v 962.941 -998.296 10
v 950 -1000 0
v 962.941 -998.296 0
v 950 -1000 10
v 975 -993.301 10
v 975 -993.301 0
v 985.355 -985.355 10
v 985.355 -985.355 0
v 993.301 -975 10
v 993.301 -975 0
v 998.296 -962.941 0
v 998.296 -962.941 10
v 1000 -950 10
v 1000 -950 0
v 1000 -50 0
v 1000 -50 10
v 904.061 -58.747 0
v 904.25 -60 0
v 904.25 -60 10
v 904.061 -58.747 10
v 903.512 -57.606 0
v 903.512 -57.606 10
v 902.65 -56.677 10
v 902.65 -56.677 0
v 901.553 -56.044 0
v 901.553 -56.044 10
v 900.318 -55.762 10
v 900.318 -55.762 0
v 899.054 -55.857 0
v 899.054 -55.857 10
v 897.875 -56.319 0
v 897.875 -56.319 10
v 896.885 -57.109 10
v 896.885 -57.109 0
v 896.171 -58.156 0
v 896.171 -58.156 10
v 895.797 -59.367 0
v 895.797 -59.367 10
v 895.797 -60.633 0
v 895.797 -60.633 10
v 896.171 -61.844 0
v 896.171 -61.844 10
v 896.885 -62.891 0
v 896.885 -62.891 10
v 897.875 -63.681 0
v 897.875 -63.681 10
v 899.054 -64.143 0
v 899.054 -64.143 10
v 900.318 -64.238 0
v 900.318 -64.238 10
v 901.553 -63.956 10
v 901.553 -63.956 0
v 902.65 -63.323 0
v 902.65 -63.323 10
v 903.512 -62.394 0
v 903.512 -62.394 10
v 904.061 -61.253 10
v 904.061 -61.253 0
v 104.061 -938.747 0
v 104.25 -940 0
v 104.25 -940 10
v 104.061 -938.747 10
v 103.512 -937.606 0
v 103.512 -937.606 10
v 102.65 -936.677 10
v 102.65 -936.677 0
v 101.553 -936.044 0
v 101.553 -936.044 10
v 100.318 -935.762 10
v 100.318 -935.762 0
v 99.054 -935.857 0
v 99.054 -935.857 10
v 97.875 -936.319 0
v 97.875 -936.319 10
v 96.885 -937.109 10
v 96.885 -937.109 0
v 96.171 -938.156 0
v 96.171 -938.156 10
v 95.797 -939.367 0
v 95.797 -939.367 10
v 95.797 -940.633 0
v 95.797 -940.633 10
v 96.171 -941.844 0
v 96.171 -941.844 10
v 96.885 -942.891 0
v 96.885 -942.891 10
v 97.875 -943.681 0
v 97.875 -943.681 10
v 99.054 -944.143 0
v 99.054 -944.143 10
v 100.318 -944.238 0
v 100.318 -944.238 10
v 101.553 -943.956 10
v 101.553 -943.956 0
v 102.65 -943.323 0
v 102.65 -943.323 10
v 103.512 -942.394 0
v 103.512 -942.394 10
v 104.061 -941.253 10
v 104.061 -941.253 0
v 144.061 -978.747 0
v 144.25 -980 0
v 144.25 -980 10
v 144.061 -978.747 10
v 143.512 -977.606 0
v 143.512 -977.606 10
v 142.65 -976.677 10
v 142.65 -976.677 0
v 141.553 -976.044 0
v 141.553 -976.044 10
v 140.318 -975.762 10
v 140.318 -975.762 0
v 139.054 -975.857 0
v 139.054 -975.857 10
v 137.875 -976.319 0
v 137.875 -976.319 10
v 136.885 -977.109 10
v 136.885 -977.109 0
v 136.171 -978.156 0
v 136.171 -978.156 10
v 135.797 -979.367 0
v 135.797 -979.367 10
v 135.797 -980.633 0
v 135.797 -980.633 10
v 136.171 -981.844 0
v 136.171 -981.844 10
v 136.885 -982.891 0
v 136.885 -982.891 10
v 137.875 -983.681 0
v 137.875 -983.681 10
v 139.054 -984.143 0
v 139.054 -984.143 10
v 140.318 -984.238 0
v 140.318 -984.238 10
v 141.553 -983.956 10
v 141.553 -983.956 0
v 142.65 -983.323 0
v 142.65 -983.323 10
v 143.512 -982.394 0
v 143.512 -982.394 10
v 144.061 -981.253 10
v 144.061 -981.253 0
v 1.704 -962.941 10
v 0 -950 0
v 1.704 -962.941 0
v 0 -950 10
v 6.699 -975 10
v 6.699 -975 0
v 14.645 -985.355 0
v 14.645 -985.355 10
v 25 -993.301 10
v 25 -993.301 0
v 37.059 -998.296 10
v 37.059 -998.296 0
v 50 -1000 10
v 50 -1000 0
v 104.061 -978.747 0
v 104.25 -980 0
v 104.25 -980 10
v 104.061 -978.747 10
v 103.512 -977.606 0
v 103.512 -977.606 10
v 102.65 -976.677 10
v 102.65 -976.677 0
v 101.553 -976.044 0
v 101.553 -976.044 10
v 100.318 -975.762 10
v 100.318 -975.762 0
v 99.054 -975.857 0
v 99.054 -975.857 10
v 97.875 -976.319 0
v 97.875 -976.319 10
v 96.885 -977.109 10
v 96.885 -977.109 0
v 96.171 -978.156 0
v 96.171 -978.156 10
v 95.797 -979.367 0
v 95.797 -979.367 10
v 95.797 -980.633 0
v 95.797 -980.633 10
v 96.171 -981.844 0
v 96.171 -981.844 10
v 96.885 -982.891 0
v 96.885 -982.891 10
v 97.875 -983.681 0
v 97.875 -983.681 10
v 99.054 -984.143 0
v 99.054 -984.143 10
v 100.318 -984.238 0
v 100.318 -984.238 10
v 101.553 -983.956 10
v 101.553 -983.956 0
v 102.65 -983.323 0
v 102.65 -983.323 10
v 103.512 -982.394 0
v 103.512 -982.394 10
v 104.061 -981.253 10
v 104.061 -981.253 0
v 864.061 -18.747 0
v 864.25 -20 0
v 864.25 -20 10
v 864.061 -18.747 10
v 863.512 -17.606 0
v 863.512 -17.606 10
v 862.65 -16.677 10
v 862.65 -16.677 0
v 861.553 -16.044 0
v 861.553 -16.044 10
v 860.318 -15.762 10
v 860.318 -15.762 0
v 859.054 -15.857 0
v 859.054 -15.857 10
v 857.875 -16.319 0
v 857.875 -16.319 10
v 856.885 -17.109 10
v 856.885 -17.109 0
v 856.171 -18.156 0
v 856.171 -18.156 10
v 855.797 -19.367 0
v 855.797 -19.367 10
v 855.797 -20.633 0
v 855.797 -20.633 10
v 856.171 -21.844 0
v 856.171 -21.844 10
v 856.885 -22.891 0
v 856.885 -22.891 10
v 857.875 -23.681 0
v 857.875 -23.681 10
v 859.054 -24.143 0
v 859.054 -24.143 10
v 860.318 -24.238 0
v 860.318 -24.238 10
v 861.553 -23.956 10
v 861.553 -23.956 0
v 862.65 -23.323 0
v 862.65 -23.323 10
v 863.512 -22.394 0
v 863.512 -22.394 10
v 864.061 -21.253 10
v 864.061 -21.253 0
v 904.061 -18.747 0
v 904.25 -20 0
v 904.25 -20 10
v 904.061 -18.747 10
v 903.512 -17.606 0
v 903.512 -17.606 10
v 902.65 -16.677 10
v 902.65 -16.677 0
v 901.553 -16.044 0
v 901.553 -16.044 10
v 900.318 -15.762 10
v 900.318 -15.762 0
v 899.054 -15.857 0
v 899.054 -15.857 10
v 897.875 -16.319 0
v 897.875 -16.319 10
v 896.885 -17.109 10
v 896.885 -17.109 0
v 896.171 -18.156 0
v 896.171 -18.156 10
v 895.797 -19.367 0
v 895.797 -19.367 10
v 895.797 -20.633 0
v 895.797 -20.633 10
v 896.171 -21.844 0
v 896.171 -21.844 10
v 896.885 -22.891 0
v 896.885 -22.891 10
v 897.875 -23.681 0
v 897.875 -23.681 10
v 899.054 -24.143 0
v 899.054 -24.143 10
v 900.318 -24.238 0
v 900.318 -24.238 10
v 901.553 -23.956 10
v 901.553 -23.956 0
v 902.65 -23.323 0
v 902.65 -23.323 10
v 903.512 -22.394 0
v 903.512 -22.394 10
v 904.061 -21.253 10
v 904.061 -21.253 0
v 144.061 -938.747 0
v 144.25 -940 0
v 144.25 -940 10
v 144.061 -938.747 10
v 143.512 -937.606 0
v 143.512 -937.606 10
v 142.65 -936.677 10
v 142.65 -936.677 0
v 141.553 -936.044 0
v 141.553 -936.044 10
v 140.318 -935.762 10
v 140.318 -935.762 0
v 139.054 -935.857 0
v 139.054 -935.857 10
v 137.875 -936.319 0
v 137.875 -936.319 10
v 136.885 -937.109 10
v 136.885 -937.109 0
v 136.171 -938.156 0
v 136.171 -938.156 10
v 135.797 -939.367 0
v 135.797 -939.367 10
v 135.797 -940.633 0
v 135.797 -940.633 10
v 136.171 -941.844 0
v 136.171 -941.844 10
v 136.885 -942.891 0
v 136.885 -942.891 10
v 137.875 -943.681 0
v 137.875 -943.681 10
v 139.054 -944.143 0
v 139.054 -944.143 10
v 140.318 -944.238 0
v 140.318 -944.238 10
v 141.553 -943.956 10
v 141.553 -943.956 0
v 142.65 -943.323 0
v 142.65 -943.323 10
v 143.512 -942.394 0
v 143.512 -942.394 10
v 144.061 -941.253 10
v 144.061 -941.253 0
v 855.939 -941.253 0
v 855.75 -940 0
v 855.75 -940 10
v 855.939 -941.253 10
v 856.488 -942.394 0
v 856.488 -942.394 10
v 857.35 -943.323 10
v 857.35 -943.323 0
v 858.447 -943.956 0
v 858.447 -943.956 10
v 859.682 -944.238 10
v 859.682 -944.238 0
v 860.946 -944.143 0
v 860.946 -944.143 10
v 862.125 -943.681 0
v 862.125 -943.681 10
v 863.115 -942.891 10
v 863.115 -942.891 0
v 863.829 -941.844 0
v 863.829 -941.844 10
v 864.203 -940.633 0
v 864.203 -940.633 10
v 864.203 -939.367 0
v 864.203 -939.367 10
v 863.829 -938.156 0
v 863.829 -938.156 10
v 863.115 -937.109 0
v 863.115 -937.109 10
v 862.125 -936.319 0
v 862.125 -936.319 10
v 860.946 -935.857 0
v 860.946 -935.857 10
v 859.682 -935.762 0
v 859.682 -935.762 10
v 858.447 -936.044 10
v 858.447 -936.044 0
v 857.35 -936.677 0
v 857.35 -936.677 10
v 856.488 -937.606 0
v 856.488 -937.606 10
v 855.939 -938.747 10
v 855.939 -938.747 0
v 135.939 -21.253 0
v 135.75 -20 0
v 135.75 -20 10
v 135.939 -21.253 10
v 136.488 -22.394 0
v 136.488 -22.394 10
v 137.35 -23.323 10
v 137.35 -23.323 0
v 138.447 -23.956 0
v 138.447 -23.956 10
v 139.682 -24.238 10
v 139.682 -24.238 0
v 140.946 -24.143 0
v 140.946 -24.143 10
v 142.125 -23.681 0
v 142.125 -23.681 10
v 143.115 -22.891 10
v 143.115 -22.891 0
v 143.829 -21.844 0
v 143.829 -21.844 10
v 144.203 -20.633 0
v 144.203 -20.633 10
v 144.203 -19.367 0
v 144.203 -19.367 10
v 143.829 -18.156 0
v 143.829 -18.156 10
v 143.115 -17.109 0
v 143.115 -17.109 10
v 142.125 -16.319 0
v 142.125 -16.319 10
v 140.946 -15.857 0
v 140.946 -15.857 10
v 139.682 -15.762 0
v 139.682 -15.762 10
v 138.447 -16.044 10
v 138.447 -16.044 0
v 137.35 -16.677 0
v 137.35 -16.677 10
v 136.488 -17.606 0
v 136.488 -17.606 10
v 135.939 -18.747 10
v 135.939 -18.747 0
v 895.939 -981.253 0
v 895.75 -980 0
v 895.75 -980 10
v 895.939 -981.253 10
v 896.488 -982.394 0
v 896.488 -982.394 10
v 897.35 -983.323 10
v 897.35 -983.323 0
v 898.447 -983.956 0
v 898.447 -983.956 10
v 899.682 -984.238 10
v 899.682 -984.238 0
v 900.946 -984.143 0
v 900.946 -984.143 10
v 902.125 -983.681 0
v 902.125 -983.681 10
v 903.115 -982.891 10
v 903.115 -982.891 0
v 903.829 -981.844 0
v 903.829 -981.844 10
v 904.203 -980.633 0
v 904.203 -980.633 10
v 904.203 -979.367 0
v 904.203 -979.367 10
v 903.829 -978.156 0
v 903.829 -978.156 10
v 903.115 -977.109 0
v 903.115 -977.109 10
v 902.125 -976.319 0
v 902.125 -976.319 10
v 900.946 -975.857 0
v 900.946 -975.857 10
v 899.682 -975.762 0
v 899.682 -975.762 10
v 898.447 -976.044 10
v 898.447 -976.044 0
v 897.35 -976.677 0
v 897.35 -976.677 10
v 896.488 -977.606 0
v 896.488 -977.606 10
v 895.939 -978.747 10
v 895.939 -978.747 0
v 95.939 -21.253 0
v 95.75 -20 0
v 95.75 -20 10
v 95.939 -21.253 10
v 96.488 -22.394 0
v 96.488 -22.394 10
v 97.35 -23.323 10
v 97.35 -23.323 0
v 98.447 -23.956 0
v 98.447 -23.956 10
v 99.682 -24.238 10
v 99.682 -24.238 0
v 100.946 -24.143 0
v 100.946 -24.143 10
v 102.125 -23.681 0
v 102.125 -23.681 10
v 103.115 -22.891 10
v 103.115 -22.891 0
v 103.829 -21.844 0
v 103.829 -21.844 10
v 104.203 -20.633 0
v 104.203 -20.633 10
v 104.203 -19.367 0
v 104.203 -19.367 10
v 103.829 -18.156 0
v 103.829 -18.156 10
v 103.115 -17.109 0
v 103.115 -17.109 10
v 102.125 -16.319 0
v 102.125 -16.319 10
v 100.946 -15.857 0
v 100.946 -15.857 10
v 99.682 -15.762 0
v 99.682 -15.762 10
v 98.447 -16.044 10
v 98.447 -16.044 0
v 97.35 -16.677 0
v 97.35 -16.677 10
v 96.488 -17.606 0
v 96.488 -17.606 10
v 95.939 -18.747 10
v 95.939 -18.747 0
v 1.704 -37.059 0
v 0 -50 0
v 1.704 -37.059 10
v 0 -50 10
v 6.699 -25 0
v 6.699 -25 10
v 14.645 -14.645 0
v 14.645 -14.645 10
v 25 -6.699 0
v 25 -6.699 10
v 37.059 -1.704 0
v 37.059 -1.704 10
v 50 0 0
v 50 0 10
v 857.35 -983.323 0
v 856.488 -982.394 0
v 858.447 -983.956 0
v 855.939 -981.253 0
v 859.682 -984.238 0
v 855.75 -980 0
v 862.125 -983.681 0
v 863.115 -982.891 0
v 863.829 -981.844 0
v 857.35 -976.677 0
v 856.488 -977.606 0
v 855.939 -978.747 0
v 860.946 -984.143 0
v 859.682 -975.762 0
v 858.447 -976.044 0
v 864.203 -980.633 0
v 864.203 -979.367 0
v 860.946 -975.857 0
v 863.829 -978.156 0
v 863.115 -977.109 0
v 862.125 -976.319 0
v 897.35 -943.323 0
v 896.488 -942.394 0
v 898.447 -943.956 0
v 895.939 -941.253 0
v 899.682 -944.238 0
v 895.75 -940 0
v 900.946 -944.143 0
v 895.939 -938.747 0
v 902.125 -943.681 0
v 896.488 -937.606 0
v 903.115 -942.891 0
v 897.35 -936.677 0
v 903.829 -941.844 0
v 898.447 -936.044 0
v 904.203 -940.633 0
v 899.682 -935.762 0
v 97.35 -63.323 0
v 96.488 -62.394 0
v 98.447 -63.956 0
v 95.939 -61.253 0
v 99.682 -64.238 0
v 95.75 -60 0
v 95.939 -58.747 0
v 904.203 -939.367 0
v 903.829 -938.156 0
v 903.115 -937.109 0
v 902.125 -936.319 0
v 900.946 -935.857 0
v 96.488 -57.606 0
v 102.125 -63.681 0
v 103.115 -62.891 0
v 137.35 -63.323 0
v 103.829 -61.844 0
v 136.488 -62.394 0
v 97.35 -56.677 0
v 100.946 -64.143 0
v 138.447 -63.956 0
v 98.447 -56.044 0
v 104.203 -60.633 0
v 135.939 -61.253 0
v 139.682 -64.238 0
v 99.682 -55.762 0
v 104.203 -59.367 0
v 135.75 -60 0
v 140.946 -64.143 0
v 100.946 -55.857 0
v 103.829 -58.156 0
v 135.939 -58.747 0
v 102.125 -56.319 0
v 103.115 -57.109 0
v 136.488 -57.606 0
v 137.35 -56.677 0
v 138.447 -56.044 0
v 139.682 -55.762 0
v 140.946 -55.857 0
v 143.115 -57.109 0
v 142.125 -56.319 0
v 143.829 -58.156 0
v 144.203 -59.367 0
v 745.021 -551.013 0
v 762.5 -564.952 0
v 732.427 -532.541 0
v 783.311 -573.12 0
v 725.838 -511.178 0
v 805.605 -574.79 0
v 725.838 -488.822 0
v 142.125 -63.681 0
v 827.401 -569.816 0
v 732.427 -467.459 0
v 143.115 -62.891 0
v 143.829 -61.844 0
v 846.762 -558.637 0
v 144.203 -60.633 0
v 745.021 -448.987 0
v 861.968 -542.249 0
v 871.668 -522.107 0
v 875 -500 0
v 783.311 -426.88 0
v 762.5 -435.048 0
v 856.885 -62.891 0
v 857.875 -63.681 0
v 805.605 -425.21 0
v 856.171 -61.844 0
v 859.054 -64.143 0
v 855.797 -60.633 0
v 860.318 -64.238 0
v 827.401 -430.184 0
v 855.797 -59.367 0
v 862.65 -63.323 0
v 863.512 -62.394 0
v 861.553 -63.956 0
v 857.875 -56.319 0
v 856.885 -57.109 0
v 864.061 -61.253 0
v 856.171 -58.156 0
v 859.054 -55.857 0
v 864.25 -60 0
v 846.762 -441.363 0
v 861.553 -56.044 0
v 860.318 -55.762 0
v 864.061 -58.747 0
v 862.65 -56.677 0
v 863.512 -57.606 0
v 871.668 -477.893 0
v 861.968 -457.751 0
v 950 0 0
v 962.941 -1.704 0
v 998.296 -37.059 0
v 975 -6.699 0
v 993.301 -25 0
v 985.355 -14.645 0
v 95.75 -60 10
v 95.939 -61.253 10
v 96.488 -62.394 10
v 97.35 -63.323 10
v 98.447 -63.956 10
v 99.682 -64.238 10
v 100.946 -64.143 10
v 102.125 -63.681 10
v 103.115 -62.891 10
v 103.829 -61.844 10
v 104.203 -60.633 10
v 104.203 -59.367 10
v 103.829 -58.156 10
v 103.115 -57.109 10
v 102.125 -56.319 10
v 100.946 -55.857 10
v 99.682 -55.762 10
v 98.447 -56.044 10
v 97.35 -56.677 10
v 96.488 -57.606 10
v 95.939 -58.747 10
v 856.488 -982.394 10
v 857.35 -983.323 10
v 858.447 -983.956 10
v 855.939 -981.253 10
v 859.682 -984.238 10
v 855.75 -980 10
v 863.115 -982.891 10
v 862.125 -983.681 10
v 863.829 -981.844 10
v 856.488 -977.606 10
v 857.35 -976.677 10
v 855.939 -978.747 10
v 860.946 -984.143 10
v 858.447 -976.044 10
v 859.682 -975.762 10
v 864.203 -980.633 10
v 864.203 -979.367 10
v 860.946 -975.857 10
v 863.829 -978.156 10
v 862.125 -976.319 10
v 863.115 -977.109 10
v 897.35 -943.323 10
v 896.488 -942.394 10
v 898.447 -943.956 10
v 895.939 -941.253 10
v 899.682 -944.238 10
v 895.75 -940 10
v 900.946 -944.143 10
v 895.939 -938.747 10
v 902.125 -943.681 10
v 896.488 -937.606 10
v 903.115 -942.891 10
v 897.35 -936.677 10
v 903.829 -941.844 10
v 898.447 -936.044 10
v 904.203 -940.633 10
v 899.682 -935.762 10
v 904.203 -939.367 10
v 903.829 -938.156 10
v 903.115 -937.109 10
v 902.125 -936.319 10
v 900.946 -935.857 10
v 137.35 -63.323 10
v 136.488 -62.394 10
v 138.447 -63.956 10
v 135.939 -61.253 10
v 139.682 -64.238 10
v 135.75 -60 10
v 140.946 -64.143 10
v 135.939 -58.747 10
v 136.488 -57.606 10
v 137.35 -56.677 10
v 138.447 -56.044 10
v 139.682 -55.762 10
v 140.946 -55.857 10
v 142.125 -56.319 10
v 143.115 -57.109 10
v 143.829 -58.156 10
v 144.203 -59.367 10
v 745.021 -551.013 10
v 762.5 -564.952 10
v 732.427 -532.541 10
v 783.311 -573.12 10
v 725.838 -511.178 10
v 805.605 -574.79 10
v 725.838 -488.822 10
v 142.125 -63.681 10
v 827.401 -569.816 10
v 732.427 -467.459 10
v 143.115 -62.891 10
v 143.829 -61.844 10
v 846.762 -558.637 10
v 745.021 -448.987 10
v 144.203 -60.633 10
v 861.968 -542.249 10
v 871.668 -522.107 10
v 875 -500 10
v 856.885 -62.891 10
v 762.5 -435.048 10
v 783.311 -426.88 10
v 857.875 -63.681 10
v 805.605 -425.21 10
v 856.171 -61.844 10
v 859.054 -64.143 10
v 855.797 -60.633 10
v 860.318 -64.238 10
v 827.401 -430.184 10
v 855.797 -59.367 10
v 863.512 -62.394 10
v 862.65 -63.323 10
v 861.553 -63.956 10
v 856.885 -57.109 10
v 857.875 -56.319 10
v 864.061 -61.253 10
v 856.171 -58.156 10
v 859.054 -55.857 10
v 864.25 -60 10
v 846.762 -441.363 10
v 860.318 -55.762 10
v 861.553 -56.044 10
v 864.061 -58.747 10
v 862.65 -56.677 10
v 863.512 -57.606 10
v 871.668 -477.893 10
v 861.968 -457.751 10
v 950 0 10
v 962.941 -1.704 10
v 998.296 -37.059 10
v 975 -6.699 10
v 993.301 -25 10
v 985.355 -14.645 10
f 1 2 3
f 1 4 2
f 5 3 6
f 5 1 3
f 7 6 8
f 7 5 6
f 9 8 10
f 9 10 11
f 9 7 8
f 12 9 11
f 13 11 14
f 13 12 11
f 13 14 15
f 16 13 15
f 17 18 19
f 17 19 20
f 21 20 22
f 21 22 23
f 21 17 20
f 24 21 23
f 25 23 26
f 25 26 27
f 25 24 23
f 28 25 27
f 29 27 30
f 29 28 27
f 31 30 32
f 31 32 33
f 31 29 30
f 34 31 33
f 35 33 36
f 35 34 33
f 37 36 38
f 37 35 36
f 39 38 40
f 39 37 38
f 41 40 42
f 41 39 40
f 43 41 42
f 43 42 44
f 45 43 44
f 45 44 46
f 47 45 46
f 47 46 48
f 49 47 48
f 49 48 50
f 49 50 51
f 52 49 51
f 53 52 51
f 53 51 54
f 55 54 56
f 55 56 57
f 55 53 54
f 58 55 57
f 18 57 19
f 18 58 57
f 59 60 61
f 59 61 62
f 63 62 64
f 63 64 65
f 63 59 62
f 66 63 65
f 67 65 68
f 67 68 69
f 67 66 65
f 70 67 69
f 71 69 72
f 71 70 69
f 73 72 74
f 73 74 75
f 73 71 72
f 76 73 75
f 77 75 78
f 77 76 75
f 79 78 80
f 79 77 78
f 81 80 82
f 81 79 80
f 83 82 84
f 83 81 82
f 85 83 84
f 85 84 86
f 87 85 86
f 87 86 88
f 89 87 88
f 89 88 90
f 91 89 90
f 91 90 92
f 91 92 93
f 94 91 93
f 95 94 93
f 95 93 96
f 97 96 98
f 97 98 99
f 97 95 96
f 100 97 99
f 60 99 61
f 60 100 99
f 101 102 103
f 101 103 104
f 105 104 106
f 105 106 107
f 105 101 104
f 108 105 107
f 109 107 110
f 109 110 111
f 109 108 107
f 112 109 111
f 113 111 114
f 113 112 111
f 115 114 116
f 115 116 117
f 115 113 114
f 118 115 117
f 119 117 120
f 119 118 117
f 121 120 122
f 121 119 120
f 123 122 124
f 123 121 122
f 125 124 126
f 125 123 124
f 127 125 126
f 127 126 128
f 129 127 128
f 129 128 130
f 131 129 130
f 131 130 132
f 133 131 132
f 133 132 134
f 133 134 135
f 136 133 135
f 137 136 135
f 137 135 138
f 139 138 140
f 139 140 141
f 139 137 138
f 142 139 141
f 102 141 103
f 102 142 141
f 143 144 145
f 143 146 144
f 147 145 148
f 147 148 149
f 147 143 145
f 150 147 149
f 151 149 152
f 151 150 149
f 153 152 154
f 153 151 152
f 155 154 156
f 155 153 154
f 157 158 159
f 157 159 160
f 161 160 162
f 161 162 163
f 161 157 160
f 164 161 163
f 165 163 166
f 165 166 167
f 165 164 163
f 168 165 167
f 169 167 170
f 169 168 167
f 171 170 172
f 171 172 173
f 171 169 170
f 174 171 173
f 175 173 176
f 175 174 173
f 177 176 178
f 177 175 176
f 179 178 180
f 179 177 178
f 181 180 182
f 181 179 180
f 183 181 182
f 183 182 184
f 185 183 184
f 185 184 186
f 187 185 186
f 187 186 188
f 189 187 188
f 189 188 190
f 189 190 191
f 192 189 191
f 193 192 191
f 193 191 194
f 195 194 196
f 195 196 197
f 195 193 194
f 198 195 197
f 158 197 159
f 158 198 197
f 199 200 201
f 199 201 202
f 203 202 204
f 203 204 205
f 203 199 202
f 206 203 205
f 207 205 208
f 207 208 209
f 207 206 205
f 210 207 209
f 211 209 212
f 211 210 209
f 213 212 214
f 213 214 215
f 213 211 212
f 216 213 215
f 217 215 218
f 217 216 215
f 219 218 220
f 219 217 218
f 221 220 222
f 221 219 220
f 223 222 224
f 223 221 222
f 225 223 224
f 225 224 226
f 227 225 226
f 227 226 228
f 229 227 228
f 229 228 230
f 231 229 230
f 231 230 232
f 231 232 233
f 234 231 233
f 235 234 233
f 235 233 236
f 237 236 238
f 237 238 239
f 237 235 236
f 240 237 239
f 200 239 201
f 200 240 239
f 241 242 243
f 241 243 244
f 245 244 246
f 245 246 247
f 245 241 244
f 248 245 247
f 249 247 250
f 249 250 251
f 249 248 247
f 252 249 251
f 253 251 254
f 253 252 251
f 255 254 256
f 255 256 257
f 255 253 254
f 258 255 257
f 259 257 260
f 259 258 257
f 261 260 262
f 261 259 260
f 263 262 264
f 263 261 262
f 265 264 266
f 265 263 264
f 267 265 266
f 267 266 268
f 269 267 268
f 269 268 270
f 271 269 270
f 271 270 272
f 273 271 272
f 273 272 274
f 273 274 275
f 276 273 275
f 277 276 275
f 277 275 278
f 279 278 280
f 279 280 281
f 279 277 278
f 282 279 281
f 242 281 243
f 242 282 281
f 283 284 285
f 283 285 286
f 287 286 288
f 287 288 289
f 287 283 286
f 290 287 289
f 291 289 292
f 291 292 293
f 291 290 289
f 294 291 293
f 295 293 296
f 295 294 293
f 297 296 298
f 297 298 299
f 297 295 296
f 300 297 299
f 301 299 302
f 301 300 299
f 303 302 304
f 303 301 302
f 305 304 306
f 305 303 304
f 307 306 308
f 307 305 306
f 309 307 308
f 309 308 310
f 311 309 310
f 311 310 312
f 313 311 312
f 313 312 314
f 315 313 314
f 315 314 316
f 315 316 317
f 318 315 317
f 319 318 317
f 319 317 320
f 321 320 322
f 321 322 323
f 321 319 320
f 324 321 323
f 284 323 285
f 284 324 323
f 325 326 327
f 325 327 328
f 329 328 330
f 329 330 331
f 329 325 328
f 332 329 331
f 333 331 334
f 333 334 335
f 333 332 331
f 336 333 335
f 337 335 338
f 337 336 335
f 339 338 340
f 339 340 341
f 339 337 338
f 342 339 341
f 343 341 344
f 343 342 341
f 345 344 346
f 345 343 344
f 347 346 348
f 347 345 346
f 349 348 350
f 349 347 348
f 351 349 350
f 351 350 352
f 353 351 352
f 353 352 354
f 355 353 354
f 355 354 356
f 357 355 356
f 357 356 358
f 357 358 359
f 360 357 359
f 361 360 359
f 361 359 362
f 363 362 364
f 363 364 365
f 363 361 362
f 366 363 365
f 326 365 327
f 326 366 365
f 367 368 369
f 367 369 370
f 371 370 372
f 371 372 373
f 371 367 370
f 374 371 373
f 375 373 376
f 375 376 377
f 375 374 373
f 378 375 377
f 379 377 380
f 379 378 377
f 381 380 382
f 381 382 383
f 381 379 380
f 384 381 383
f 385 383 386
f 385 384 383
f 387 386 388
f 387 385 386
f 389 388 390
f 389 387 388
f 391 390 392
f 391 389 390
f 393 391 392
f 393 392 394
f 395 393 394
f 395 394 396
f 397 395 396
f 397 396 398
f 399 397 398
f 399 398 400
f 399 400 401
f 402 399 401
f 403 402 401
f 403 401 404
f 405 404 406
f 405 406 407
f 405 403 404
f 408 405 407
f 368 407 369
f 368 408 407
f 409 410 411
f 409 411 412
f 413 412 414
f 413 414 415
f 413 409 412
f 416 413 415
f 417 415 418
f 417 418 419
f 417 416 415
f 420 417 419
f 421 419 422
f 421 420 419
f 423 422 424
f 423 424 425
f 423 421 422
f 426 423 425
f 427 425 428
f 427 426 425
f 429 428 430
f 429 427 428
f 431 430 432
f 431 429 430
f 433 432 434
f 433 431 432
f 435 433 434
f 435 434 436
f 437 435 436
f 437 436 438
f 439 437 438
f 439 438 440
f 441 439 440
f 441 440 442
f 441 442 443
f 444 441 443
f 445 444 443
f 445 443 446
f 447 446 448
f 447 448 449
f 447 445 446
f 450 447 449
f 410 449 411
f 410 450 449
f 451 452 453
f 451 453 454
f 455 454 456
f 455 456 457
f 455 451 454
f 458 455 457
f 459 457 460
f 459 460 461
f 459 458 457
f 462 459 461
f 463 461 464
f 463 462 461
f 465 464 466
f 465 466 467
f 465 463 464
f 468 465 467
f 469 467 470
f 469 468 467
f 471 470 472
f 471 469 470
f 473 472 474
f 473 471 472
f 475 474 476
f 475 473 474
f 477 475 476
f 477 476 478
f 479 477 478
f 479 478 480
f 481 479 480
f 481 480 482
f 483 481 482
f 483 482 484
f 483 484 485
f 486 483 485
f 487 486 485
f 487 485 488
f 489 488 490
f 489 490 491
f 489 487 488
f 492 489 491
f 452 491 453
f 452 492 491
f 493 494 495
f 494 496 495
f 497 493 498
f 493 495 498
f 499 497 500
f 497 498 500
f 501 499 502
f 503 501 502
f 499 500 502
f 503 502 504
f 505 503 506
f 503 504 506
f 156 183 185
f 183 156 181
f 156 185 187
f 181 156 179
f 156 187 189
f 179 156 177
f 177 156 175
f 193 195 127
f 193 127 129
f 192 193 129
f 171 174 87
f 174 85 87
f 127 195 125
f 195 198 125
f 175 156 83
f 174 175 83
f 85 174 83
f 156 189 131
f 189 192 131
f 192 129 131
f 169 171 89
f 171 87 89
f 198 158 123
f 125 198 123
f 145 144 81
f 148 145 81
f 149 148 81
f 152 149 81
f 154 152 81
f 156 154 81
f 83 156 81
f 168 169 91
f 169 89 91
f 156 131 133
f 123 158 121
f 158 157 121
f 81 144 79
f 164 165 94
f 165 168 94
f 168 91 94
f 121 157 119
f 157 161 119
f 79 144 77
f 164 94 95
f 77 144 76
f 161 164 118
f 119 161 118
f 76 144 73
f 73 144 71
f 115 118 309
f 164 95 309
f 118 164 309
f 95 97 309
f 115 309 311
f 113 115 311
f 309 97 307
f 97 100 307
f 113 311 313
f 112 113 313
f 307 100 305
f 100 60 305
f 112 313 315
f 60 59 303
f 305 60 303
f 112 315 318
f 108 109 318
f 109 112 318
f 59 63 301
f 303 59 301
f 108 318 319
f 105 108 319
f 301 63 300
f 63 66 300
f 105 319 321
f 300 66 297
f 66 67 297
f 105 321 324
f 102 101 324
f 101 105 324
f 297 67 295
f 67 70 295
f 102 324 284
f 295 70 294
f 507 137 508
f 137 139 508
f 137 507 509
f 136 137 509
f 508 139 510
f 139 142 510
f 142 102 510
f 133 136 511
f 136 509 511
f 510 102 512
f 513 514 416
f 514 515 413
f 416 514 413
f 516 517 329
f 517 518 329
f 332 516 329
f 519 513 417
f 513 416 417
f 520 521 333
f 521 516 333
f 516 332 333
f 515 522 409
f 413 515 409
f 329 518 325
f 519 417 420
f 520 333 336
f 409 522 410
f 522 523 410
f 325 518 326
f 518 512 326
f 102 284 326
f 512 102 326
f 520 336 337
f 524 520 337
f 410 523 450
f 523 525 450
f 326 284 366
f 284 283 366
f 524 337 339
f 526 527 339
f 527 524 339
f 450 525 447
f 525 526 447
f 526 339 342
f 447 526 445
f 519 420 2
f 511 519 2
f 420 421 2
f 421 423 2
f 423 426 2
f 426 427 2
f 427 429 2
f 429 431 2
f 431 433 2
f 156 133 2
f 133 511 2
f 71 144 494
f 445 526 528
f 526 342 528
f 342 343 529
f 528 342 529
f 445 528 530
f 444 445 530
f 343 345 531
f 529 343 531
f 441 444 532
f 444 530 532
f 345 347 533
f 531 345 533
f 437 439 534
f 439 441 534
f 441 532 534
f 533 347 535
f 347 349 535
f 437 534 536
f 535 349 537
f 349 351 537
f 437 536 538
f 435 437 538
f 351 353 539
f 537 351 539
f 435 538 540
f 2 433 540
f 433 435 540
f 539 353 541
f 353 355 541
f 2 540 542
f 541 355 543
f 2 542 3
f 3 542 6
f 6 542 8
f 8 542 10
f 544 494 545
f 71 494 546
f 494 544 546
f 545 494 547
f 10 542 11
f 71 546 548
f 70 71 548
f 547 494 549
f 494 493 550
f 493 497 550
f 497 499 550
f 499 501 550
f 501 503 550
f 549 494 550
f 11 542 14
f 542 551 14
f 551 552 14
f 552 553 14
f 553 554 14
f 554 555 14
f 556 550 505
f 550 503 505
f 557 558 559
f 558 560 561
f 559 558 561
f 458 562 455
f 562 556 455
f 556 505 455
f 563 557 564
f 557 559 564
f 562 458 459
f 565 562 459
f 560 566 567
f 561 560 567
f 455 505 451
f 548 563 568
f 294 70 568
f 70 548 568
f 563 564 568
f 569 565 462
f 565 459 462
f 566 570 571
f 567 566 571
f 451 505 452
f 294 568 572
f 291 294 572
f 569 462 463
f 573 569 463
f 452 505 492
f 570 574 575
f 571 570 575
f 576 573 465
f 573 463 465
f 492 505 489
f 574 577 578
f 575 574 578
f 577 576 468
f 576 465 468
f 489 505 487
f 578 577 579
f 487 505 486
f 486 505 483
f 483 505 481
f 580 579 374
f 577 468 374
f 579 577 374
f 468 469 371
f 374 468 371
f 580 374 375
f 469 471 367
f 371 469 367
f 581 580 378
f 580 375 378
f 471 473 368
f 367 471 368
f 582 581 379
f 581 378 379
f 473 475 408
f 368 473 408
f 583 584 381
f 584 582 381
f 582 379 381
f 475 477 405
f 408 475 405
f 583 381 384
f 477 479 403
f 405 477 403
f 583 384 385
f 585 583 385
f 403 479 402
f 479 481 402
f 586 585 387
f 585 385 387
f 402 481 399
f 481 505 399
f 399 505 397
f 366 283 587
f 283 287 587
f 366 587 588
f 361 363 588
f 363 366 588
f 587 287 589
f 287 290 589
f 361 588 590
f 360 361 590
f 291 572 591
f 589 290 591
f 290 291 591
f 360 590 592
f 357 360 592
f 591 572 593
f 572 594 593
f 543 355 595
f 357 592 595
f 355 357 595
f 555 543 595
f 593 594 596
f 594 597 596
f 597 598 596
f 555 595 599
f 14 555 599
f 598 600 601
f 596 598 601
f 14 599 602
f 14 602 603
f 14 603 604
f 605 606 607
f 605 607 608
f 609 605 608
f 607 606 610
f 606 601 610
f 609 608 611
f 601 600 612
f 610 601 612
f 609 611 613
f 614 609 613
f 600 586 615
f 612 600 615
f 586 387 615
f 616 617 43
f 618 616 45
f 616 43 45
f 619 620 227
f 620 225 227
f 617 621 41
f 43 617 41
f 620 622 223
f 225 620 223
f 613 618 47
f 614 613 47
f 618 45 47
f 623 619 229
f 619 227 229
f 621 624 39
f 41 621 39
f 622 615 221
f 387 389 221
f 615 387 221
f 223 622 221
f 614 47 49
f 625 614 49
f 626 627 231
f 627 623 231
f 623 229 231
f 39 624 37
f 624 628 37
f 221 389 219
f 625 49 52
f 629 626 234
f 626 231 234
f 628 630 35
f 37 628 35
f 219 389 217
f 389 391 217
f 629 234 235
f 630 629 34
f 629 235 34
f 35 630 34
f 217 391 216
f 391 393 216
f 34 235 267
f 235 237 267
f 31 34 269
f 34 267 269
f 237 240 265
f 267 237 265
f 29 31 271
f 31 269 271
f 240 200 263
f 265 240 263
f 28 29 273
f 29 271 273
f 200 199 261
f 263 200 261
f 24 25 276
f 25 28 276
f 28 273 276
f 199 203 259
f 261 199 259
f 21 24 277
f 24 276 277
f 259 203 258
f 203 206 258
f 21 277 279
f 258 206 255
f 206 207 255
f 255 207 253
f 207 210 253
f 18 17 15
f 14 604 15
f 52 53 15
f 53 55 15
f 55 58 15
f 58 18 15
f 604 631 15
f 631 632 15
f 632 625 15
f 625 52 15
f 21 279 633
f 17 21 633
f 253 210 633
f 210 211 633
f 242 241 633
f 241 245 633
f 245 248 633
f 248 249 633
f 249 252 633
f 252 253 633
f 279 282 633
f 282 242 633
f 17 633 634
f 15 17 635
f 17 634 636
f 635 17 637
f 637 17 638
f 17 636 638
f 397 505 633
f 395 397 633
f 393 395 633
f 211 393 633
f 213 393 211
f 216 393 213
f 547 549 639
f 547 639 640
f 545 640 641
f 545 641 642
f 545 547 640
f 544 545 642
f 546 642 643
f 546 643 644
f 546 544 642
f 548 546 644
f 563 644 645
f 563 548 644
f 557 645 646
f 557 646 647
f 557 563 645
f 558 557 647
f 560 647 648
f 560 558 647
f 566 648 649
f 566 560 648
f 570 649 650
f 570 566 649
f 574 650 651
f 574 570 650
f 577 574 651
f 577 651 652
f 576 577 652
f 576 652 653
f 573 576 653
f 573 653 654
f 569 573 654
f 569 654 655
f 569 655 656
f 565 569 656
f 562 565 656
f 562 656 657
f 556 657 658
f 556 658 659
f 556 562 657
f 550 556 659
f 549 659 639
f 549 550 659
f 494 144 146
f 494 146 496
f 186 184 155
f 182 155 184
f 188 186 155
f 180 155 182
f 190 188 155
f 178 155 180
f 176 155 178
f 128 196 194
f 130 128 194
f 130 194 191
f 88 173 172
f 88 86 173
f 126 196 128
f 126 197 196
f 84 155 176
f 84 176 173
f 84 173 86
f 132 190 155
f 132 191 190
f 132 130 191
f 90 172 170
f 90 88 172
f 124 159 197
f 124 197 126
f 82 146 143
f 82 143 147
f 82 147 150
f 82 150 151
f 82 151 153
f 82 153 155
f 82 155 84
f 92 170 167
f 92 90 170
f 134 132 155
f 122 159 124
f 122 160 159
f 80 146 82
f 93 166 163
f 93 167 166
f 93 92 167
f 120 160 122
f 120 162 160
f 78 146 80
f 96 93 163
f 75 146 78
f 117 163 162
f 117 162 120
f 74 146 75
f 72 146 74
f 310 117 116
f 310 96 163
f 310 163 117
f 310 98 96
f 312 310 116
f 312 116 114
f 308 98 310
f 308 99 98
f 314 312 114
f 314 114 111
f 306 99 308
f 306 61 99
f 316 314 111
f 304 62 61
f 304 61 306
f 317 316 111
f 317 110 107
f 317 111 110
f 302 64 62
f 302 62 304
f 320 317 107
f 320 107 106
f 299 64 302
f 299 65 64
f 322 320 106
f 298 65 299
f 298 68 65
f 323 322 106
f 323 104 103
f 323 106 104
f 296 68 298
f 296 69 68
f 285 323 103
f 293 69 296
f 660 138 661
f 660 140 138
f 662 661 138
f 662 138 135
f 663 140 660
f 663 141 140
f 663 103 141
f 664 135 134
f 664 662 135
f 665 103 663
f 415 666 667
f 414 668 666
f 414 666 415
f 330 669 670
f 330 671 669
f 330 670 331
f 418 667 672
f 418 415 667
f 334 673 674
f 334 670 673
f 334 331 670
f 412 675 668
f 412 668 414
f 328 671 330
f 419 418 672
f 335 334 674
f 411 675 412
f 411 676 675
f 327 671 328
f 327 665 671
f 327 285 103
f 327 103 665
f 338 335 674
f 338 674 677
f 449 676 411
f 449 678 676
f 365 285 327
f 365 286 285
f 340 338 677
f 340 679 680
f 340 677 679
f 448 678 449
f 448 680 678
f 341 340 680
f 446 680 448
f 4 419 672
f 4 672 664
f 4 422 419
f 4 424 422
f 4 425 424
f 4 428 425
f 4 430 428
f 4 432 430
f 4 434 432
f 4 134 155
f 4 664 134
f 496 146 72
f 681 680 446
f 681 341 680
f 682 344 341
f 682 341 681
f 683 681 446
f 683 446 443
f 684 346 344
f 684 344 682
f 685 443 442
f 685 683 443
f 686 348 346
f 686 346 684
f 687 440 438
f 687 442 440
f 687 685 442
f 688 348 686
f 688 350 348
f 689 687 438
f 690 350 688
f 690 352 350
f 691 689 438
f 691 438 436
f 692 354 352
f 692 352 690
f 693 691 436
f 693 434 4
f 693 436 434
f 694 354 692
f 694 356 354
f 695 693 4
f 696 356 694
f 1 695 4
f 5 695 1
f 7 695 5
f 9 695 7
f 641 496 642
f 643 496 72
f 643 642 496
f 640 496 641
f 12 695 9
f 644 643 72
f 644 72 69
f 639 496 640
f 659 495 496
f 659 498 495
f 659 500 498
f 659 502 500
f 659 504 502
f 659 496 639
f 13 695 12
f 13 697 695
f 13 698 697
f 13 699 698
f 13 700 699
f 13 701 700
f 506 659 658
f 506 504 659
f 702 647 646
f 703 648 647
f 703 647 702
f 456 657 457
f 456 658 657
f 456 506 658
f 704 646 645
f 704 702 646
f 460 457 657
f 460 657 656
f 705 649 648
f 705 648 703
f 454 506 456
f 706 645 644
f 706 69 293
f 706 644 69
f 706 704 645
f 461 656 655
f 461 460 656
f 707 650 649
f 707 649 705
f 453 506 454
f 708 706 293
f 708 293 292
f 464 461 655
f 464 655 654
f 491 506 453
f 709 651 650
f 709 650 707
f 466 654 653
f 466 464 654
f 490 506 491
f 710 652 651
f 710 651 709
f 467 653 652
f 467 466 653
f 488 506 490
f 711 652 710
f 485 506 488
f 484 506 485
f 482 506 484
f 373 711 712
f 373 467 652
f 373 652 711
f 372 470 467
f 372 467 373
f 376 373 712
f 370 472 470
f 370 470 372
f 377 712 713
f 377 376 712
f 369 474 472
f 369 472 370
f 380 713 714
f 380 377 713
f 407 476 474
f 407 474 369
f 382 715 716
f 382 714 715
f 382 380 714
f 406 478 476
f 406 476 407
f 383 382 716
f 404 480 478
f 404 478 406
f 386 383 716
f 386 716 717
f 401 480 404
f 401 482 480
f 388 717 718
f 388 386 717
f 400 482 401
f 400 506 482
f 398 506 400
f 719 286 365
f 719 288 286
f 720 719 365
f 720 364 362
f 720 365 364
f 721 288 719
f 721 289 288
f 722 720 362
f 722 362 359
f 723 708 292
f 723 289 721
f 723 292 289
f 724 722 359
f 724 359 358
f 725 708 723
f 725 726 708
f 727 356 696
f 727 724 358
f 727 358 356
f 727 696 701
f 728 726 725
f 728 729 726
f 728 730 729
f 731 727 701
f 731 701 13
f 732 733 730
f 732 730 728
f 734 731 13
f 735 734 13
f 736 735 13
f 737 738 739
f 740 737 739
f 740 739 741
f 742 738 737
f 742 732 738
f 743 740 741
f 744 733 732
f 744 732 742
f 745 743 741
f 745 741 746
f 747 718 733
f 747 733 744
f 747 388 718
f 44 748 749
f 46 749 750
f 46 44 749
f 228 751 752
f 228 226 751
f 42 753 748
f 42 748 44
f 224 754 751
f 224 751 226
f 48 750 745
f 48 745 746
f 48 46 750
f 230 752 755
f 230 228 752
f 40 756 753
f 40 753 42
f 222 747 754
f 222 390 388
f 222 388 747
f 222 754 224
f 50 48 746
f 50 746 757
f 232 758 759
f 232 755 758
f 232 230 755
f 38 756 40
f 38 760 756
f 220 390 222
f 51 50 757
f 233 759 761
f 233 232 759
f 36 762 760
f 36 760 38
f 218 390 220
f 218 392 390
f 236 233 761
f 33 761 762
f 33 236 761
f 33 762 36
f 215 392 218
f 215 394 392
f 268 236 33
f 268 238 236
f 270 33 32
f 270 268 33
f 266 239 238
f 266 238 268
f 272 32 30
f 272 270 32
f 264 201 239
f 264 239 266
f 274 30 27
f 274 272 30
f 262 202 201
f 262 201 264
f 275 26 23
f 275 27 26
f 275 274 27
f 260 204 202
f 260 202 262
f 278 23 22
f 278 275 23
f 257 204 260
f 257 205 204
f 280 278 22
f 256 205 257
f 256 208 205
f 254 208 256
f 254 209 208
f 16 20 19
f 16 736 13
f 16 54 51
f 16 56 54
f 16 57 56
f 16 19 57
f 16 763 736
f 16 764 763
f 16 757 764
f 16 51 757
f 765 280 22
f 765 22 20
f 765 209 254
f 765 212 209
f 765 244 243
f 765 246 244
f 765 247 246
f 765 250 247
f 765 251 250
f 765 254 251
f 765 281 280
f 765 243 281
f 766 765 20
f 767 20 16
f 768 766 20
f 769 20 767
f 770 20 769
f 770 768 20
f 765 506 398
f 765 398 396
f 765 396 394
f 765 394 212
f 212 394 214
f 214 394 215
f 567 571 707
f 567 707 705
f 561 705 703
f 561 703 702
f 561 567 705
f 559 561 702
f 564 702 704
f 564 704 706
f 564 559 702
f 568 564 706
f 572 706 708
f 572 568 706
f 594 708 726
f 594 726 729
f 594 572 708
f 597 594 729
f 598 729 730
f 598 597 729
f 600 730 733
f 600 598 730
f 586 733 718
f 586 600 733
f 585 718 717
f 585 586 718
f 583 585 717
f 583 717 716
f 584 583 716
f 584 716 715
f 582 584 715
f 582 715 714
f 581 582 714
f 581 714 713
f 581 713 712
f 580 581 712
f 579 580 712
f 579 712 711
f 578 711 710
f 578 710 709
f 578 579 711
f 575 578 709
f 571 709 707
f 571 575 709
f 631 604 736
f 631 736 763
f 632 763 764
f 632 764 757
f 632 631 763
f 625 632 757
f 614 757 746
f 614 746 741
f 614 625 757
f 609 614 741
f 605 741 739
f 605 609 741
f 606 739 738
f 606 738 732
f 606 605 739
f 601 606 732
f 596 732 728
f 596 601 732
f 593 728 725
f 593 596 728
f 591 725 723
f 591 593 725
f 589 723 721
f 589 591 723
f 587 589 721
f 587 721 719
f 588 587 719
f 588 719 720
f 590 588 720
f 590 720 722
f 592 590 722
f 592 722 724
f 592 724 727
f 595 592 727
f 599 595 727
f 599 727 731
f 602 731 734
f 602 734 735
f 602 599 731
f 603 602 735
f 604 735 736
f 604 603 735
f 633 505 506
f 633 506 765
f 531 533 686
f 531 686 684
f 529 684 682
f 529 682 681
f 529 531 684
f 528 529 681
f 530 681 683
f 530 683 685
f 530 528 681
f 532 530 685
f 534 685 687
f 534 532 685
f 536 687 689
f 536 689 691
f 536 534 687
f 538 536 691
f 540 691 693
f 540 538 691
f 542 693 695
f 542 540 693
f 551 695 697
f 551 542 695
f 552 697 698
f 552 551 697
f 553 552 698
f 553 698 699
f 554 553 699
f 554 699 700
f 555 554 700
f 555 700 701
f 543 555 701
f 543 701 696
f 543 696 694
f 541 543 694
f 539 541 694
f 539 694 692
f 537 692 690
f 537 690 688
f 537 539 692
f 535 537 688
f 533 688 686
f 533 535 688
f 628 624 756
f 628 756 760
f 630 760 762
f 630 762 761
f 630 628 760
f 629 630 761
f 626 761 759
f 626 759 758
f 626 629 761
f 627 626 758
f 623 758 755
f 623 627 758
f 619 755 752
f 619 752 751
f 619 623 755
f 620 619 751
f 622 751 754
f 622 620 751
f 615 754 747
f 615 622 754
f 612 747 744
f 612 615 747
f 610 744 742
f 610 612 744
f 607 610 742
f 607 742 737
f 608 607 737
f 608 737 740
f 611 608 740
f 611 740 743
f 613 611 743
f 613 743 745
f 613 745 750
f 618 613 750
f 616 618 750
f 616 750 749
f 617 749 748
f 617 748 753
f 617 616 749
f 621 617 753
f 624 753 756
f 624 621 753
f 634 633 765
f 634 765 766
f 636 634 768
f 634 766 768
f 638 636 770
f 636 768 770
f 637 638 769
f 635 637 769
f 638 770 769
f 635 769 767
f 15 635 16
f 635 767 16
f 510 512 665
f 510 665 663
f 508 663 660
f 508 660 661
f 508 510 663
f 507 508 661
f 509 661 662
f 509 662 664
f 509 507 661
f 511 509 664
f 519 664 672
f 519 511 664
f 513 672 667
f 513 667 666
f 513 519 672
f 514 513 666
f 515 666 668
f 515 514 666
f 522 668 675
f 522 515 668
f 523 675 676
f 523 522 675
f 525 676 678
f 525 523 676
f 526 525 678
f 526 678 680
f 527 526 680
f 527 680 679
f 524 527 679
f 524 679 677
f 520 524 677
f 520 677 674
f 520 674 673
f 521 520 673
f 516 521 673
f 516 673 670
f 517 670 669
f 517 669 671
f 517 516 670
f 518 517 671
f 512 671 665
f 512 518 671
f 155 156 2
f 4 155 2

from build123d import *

# Parameters (mm, degrees)
SKETCH_1_W      = 1000
SKETCH_1_H      = 1000
SKETCH_1_R      = 75
SKETCH_1_R_2    = 4.25
EXTRUDE_1_DEPTH = 10
FILLET_1_R      = 50


with BuildPart() as part:
    # 草图1 → 凸台-拉伸1 (new body)
    with BuildSketch(Plane.XY):
        with Locations((500, -500)):
            Rectangle(SKETCH_1_W, SKETCH_1_H)
        with Locations((800, -500)):
            Circle(SKETCH_1_R, mode=Mode.SUBTRACT)
        with Locations((900, -20)):
            Circle(SKETCH_1_R_2, mode=Mode.SUBTRACT)
        with Locations((900, -60)):
            Circle(SKETCH_1_R_2, mode=Mode.SUBTRACT)
        with Locations((860, -20)):
            Circle(SKETCH_1_R_2, mode=Mode.SUBTRACT)
        with Locations((860, -60)):
            Circle(SKETCH_1_R_2, mode=Mode.SUBTRACT)
        with Locations(Location((140, -20, 0), (0, 0, 180))):
            Circle(SKETCH_1_R_2, mode=Mode.SUBTRACT)
        with Locations(Location((100, -20, 0), (0, 0, 180))):
            Circle(SKETCH_1_R_2, mode=Mode.SUBTRACT)
        with Locations(Location((140, -60, 0), (0, 0, 180))):
            Circle(SKETCH_1_R_2, mode=Mode.SUBTRACT)
        with Locations(Location((100, -60, 0), (0, 0, 180))):
            Circle(SKETCH_1_R_2, mode=Mode.SUBTRACT)
        with Locations((100, -980)):
            Circle(SKETCH_1_R_2, mode=Mode.SUBTRACT)
        with Locations((140, -980)):
            Circle(SKETCH_1_R_2, mode=Mode.SUBTRACT)
        with Locations((100, -940)):
            Circle(SKETCH_1_R_2, mode=Mode.SUBTRACT)
        with Locations((140, -940)):
            Circle(SKETCH_1_R_2, mode=Mode.SUBTRACT)
        with Locations(Location((860, -980, 0), (0, 0, 180))):
            Circle(SKETCH_1_R_2, mode=Mode.SUBTRACT)
        with Locations(Location((900, -980, 0), (0, 0, 180))):
            Circle(SKETCH_1_R_2, mode=Mode.SUBTRACT)
        with Locations(Location((860, -940, 0), (0, 0, 180))):
            Circle(SKETCH_1_R_2, mode=Mode.SUBTRACT)
        with Locations(Location((900, -940, 0), (0, 0, 180))):
            Circle(SKETCH_1_R_2, mode=Mode.SUBTRACT)
    extrude(amount=EXTRUDE_1_DEPTH)

    # 圆角1
    fillet_1_edges = [part.edges().sort_by_distance(p)[0] for p in [
        (0, 0, 5),
        (1000, 0, 5),
        (1000, -1000, 5),
        (0, -1000, 5),
    ]]
    fillet(fillet_1_edges, radius=FILLET_1_R)


solid = part.part
